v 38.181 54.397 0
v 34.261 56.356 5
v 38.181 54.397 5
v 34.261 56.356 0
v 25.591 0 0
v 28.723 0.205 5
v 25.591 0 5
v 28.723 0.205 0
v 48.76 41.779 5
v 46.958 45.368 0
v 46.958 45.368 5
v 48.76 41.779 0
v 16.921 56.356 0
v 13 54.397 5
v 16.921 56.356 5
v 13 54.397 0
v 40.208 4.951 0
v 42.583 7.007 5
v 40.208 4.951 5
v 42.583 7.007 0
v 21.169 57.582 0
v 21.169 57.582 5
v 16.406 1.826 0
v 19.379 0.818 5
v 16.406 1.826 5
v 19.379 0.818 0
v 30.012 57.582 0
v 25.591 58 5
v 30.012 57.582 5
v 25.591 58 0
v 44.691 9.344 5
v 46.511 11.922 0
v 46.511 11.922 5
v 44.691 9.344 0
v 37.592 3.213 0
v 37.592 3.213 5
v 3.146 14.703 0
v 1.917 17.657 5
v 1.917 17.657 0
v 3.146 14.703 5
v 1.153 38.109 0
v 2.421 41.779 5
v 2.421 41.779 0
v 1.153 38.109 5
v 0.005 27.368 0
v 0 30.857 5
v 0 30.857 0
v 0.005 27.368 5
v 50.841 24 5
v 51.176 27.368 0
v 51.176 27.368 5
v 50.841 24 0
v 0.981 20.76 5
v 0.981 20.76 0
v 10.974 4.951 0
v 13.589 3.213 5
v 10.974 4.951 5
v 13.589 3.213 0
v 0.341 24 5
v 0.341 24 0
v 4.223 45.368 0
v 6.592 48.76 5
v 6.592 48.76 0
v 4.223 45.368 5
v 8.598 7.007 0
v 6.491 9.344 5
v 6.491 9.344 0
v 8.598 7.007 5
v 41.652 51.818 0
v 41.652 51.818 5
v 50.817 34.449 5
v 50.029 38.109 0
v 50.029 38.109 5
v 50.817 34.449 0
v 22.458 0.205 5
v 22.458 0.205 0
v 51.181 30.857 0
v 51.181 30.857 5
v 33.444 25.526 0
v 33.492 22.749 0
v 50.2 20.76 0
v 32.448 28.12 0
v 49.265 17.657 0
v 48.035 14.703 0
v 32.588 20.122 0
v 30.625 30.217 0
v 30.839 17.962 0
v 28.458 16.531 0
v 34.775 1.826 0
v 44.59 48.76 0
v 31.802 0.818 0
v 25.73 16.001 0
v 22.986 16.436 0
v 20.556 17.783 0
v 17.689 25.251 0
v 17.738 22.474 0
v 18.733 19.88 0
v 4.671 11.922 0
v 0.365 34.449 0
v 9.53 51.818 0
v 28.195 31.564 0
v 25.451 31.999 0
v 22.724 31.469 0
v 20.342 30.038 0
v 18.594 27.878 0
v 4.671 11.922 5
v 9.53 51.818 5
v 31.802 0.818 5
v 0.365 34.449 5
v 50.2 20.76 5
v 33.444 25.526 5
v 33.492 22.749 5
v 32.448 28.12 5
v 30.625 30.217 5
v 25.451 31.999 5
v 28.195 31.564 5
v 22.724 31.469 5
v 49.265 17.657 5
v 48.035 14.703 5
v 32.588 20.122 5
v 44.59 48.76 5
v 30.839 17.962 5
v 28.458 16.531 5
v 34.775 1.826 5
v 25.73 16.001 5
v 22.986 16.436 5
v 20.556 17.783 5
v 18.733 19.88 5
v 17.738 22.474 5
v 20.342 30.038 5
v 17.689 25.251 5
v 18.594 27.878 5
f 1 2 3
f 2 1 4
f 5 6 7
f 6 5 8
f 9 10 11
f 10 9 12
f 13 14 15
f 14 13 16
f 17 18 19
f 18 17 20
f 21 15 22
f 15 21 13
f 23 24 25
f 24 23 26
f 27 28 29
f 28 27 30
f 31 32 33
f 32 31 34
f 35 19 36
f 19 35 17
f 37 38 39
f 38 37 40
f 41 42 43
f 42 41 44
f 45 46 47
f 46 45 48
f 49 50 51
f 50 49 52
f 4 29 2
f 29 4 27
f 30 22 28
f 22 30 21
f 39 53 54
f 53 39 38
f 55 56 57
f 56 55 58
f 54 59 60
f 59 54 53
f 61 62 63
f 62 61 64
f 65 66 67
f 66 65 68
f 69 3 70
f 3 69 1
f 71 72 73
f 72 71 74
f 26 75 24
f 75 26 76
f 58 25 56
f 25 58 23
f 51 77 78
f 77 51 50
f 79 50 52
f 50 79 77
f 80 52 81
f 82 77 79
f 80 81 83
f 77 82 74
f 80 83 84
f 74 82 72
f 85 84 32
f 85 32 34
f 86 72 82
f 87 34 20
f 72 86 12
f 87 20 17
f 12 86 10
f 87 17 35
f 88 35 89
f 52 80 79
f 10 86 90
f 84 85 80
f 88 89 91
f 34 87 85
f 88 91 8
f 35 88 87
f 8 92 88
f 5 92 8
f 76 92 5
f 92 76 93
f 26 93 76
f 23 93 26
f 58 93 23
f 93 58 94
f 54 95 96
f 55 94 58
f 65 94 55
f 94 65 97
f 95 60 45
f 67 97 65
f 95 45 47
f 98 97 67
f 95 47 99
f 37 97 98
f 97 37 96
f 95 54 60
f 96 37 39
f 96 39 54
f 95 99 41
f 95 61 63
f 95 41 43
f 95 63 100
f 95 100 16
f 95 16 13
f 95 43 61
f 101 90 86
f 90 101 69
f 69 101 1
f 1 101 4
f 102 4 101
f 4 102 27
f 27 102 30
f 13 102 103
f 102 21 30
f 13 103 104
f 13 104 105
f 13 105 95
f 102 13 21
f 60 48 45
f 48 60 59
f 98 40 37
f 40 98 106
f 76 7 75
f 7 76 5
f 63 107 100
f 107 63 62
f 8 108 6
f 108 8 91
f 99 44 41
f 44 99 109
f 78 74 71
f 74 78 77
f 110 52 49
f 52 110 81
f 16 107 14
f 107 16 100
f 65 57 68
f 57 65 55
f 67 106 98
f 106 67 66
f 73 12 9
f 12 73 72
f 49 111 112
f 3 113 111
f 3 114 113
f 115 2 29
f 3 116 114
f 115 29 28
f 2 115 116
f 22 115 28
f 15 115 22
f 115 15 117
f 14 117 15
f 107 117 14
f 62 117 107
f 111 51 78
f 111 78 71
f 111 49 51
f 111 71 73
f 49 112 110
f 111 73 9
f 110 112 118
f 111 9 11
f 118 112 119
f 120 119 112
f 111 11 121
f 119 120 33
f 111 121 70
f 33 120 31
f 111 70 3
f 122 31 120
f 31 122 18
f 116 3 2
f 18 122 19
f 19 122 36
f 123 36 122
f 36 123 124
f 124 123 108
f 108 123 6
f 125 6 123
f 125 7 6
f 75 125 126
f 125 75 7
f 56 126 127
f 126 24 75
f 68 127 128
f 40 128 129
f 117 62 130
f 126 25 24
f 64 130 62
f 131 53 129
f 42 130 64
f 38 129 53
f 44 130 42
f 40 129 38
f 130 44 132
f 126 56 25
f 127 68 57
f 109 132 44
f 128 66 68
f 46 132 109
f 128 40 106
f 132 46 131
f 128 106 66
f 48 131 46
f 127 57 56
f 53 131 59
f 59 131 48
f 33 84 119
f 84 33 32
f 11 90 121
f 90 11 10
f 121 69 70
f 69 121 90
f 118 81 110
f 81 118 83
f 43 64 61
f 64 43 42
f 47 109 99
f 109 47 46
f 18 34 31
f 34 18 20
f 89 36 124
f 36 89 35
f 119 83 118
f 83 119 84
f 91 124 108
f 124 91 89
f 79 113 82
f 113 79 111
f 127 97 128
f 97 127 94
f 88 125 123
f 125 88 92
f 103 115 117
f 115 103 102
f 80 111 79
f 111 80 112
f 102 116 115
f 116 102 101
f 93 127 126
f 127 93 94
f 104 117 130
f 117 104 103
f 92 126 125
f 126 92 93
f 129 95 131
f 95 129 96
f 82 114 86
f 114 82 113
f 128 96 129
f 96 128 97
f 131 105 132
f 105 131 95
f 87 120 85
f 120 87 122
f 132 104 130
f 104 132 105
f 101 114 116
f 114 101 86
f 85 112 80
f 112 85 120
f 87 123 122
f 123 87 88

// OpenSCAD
$fn = 32;

// ----------------------------------------------------------------------
// Cam plate: single_lobe cam, base R24
// ----------------------------------------------------------------------

// --- parameters (mm) ---
base_r = 24;              // base circle radius
lobe_h = 10;              // cam lobe rise
bore_r = 8;               // shaft bore radius
plate_t = 5;              // plate thickness, Z (extrusion height)

profile = [[50.841, 24], [51.176, 27.368], [51.181, 30.857], [50.817, 34.449], [50.029, 38.109], [48.76, 41.779], [46.958, 45.368], [44.59, 48.76], [41.652, 51.818], [38.181, 54.397], [34.261, 56.356], [30.012, 57.582], [25.591, 58], [21.169, 57.582], [16.921, 56.356], [13, 54.397], [9.53, 51.818], [6.592, 48.76], [4.223, 45.368], [2.421, 41.779], [1.153, 38.109], [0.365, 34.449], [0, 30.857], [0.005, 27.368], [0.341, 24], [0.981, 20.76], [1.917, 17.657], [3.146, 14.703], [4.671, 11.922], [6.491, 9.344], [8.598, 7.007], [10.974, 4.951], [13.589, 3.213], [16.406, 1.826], [19.379, 0.818], [22.458, 0.205], [25.591, 0], [28.723, 0.205], [31.802, 0.818], [34.775, 1.826], [37.592, 3.213], [40.208, 4.951], [42.583, 7.007], [44.691, 9.344], [46.511, 11.922], [48.035, 14.703], [49.265, 17.657], [50.2, 20.76]];  // primary outline, 48 points, counter clockwise
void_1 = [[33.444, 25.526], [32.448, 28.12], [30.625, 30.217], [28.195, 31.564], [25.451, 31.999], [22.724, 31.469], [20.342, 30.038], [18.594, 27.878], [17.689, 25.251], [17.738, 22.474], [18.733, 19.88], [20.556, 17.783], [22.986, 16.436], [25.73, 16.001], [28.458, 16.531], [30.839, 17.962], [32.588, 20.122], [33.492, 22.749]];  // shaft bore, 18 points

// --- the one profile operation ---
difference() {
  linear_extrude(height = plate_t) polygon(points = profile);
  translate([0, 0, -1])
    linear_extrude(height = plate_t + 2) polygon(points = void_1);
}
